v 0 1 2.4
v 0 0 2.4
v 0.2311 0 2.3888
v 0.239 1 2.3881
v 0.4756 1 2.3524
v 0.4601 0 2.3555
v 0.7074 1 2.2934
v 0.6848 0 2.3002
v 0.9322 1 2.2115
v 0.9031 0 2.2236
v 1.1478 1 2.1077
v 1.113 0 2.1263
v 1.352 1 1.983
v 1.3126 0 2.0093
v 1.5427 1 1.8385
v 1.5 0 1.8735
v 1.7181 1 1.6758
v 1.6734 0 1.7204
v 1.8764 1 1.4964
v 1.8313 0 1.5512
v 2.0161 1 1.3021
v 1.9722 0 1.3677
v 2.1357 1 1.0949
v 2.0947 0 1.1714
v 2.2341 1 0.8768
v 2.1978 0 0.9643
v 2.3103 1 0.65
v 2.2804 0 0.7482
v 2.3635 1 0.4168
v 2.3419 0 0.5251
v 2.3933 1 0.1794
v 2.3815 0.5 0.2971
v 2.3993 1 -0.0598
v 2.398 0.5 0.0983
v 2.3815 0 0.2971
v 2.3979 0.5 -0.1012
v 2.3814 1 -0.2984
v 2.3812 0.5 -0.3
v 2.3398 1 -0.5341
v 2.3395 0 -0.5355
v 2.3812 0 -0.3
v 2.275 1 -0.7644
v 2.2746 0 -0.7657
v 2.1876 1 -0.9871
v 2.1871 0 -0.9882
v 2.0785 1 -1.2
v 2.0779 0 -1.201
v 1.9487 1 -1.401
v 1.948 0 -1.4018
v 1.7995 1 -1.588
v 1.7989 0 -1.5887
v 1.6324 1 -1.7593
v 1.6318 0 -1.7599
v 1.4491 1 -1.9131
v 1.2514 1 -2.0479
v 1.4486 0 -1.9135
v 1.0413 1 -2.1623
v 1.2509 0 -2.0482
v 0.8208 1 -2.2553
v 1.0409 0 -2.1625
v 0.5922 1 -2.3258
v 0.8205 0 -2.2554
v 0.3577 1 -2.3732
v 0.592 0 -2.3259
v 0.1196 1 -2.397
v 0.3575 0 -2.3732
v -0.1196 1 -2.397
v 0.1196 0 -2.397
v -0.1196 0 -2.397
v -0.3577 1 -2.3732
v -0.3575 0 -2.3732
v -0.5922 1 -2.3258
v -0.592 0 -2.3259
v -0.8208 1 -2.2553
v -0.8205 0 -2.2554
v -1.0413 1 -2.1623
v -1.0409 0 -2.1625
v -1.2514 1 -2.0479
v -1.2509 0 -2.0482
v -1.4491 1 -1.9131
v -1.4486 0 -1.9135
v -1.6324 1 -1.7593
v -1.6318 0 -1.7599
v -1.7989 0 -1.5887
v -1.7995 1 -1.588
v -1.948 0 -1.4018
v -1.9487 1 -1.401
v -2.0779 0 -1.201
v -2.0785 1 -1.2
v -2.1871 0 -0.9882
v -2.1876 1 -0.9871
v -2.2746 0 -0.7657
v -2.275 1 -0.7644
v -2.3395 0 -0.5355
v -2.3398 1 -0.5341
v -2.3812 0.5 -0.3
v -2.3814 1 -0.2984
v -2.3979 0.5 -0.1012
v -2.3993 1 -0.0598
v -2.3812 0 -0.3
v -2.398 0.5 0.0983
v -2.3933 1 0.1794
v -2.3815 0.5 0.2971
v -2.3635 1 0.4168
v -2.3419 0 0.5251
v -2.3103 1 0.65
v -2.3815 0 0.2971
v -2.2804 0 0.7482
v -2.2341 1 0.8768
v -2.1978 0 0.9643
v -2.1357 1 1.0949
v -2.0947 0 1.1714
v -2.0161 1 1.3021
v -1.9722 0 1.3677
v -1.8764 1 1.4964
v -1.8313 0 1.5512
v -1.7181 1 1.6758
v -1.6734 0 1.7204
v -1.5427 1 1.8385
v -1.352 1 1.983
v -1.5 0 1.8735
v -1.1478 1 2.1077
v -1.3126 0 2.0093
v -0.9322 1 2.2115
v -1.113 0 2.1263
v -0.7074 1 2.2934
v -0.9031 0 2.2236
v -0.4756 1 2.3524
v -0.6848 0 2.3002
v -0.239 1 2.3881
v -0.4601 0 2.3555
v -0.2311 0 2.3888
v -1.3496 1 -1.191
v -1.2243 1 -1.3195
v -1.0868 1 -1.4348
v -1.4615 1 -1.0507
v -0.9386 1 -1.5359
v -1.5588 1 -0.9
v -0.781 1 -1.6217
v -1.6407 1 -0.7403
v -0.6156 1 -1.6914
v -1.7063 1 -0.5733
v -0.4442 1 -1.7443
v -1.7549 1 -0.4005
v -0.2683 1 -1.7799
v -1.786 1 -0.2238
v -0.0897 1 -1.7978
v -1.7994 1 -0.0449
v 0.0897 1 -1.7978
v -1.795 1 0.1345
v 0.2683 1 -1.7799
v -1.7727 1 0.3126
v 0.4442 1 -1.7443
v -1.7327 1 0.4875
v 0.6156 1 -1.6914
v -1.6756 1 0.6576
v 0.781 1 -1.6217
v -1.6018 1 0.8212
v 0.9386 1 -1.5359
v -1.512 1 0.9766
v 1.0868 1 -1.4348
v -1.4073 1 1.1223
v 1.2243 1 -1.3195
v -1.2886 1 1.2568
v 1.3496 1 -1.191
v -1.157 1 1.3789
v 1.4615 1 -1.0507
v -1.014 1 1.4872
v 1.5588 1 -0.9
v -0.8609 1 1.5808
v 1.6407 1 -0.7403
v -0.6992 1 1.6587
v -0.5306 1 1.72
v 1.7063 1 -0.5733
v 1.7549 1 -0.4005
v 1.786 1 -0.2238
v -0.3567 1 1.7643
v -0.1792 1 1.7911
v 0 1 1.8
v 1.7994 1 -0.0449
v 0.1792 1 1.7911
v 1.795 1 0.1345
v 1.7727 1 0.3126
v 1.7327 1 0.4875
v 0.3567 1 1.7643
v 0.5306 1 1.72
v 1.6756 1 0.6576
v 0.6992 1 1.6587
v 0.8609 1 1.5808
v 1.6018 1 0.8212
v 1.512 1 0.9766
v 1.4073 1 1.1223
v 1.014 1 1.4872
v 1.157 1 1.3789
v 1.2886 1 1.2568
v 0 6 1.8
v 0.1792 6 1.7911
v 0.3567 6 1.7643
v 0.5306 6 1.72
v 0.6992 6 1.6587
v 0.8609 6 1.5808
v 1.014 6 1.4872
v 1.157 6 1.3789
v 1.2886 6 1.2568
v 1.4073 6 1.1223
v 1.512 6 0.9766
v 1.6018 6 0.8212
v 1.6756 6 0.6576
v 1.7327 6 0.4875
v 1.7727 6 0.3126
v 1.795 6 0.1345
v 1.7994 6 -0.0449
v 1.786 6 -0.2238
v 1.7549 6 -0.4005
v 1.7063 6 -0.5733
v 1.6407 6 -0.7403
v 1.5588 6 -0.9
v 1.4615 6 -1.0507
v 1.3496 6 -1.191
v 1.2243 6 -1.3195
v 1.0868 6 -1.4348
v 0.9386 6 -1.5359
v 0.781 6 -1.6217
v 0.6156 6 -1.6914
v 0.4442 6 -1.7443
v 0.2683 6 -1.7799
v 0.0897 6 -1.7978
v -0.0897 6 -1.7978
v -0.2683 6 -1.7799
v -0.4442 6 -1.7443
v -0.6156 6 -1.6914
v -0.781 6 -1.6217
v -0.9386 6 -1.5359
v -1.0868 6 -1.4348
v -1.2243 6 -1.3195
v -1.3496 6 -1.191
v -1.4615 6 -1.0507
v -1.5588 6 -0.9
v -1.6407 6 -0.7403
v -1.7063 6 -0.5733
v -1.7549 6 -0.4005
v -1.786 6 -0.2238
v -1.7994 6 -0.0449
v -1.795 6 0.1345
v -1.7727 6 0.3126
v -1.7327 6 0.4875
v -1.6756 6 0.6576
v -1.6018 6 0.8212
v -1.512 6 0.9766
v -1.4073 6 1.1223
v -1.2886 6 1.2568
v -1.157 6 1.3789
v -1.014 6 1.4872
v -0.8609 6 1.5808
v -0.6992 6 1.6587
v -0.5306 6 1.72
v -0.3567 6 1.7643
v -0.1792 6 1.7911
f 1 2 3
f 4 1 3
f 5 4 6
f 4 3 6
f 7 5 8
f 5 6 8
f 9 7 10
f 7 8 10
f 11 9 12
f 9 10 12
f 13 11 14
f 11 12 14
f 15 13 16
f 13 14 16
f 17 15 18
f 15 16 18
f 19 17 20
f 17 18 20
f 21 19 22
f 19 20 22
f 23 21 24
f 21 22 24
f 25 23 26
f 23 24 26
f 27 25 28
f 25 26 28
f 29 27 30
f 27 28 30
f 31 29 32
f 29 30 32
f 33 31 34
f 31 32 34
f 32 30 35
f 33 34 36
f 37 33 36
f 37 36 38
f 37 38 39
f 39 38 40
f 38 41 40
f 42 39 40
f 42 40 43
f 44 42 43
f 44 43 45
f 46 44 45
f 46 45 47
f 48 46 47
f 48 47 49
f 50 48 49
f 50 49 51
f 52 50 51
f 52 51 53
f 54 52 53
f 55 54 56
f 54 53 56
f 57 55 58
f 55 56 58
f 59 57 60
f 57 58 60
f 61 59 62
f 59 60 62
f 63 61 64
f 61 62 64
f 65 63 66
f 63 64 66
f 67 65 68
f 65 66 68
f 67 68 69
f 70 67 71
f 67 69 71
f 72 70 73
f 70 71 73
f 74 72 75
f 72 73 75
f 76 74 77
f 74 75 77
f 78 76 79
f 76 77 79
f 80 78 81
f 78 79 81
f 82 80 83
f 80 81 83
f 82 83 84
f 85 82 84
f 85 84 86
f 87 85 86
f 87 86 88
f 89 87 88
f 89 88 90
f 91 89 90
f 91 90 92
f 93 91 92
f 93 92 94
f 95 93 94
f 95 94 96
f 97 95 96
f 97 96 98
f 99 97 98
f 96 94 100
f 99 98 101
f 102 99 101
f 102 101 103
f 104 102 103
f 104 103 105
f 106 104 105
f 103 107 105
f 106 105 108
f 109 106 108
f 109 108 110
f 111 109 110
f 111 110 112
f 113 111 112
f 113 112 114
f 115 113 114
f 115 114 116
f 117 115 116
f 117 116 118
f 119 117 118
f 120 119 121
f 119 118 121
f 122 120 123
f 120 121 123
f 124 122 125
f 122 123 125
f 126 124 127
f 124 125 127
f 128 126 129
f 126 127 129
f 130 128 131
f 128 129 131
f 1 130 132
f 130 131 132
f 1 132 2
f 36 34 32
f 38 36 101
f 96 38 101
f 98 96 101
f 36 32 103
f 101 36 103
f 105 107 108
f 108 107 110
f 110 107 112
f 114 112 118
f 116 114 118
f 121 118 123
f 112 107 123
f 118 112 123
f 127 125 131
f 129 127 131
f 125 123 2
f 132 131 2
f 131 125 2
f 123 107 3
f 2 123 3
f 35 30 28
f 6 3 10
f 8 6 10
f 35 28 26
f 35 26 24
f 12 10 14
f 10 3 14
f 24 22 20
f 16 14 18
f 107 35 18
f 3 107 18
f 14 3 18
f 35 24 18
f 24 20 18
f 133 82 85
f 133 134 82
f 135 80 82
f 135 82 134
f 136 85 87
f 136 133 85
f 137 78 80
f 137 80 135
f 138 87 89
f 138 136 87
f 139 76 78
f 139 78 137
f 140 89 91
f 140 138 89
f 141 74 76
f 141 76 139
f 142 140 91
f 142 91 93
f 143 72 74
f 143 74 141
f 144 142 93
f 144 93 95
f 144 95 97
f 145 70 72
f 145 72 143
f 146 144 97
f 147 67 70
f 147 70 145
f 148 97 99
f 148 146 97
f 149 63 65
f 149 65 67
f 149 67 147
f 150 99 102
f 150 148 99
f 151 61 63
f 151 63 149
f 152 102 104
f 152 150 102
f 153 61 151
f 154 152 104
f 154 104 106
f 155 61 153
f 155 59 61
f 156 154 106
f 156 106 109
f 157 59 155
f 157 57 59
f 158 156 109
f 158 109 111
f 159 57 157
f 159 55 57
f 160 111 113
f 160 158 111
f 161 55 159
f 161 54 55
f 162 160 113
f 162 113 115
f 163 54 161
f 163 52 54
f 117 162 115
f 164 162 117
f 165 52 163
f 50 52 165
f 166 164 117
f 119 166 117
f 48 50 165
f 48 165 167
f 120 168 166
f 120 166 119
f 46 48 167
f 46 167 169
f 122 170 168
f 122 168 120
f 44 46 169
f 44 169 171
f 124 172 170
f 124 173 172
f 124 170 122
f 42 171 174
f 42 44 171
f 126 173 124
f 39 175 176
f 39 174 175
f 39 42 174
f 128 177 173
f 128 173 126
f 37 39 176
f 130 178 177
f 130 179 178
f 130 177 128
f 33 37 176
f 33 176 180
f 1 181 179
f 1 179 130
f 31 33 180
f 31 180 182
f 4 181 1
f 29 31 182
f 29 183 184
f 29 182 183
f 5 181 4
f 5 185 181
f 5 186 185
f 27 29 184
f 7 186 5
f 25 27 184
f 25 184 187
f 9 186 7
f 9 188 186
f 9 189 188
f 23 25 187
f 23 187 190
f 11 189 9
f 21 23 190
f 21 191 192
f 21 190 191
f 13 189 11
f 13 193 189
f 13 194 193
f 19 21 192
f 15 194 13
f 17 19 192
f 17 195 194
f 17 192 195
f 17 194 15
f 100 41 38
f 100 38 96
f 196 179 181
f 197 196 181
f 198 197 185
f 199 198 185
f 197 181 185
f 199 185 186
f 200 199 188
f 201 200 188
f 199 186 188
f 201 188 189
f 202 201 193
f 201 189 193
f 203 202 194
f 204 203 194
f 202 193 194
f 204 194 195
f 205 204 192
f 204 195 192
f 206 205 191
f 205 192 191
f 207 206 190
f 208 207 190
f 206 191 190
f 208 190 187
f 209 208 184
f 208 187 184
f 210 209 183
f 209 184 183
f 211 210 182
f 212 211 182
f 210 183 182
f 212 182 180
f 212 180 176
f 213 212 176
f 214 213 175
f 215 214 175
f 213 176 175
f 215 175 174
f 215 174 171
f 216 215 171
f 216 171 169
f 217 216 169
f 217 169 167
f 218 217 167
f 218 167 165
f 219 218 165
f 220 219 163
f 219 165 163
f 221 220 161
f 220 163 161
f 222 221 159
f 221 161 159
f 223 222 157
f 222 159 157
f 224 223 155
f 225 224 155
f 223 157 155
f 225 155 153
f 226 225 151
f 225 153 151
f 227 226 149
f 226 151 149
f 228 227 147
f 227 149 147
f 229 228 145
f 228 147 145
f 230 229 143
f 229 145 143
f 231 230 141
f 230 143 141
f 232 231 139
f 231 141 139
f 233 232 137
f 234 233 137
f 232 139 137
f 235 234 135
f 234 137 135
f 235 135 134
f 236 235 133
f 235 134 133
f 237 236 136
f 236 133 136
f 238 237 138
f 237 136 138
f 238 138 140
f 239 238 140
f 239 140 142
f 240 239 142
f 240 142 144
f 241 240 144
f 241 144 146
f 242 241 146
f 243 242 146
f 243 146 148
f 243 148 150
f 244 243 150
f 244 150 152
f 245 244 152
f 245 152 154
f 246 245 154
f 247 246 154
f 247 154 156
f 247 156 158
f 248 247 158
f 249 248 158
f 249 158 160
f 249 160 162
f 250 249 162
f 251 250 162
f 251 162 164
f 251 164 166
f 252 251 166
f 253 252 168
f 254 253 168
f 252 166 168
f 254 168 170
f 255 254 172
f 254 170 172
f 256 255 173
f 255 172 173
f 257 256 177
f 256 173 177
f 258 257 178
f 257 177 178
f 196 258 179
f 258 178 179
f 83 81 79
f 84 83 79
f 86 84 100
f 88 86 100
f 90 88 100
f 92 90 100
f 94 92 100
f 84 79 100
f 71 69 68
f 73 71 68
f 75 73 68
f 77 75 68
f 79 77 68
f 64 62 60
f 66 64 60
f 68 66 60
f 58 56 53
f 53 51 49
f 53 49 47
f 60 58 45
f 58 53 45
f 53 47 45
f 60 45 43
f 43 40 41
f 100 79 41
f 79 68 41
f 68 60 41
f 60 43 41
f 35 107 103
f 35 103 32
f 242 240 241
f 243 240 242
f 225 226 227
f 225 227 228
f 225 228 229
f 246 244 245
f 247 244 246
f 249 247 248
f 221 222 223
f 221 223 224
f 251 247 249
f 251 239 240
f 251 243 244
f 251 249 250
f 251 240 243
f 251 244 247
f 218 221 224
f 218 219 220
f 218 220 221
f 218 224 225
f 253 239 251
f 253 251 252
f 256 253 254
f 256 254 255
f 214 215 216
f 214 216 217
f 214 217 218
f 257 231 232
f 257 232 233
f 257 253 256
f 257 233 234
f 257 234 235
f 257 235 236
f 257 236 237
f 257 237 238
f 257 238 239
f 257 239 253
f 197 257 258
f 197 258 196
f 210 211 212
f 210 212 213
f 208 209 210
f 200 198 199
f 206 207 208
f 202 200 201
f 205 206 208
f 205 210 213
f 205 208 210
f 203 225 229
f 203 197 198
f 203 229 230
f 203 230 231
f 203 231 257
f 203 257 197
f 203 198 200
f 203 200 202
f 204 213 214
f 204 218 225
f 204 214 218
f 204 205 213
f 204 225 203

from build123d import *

# Parameters (mm, degrees)
ESQUISSE1_R             = 2.4
ESQUISSE1_R_2           = 1.8
BOSS_EXTRU_1_DEPTH      = 1
ESQUISSE2_R             = 1.8
BOSS_EXTRU_2_DEPTH      = 5
ENL_V_MAT_EXTRU_1_DEPTH = 0.5


with BuildPart() as part:
    # Esquisse1 → Boss.-Extru.1 (new body)
    with BuildSketch(Plane(origin=(0, 0, 0), x_dir=(1, 0, 0), z_dir=(0, 1, 0))):
        with Locations(Location((0, 0, 0), (0, 0, 270))):
            Circle(ESQUISSE1_R)
        Circle(ESQUISSE1_R_2, mode=Mode.SUBTRACT)
        Circle(ESQUISSE1_R_2)
    extrude(amount=BOSS_EXTRU_1_DEPTH)

    # Esquisse2 → Boss.-Extru.2 (add)
    with BuildSketch(Plane(origin=(0, 1, 0), x_dir=(1, 0, 0), z_dir=(0, 1, 0))):
        with Locations(Location((0, 0, 0), (0, 0, 270))):
            Circle(ESQUISSE2_R)
    extrude(amount=BOSS_EXTRU_2_DEPTH)

    # Esquisse3 → Enlèv. mat.-Extru.1 (cut)
    with BuildSketch(Plane.XZ):
        Polygon((2.4, 0), (2.4, -0.3), (-2.4, -0.3), (-2.4, 0), (-2.4, 0.297130131), (2.4, 0.297130131), align=None)
    extrude(amount=-ENL_V_MAT_EXTRU_1_DEPTH, mode=Mode.SUBTRACT)


solid = part.part
